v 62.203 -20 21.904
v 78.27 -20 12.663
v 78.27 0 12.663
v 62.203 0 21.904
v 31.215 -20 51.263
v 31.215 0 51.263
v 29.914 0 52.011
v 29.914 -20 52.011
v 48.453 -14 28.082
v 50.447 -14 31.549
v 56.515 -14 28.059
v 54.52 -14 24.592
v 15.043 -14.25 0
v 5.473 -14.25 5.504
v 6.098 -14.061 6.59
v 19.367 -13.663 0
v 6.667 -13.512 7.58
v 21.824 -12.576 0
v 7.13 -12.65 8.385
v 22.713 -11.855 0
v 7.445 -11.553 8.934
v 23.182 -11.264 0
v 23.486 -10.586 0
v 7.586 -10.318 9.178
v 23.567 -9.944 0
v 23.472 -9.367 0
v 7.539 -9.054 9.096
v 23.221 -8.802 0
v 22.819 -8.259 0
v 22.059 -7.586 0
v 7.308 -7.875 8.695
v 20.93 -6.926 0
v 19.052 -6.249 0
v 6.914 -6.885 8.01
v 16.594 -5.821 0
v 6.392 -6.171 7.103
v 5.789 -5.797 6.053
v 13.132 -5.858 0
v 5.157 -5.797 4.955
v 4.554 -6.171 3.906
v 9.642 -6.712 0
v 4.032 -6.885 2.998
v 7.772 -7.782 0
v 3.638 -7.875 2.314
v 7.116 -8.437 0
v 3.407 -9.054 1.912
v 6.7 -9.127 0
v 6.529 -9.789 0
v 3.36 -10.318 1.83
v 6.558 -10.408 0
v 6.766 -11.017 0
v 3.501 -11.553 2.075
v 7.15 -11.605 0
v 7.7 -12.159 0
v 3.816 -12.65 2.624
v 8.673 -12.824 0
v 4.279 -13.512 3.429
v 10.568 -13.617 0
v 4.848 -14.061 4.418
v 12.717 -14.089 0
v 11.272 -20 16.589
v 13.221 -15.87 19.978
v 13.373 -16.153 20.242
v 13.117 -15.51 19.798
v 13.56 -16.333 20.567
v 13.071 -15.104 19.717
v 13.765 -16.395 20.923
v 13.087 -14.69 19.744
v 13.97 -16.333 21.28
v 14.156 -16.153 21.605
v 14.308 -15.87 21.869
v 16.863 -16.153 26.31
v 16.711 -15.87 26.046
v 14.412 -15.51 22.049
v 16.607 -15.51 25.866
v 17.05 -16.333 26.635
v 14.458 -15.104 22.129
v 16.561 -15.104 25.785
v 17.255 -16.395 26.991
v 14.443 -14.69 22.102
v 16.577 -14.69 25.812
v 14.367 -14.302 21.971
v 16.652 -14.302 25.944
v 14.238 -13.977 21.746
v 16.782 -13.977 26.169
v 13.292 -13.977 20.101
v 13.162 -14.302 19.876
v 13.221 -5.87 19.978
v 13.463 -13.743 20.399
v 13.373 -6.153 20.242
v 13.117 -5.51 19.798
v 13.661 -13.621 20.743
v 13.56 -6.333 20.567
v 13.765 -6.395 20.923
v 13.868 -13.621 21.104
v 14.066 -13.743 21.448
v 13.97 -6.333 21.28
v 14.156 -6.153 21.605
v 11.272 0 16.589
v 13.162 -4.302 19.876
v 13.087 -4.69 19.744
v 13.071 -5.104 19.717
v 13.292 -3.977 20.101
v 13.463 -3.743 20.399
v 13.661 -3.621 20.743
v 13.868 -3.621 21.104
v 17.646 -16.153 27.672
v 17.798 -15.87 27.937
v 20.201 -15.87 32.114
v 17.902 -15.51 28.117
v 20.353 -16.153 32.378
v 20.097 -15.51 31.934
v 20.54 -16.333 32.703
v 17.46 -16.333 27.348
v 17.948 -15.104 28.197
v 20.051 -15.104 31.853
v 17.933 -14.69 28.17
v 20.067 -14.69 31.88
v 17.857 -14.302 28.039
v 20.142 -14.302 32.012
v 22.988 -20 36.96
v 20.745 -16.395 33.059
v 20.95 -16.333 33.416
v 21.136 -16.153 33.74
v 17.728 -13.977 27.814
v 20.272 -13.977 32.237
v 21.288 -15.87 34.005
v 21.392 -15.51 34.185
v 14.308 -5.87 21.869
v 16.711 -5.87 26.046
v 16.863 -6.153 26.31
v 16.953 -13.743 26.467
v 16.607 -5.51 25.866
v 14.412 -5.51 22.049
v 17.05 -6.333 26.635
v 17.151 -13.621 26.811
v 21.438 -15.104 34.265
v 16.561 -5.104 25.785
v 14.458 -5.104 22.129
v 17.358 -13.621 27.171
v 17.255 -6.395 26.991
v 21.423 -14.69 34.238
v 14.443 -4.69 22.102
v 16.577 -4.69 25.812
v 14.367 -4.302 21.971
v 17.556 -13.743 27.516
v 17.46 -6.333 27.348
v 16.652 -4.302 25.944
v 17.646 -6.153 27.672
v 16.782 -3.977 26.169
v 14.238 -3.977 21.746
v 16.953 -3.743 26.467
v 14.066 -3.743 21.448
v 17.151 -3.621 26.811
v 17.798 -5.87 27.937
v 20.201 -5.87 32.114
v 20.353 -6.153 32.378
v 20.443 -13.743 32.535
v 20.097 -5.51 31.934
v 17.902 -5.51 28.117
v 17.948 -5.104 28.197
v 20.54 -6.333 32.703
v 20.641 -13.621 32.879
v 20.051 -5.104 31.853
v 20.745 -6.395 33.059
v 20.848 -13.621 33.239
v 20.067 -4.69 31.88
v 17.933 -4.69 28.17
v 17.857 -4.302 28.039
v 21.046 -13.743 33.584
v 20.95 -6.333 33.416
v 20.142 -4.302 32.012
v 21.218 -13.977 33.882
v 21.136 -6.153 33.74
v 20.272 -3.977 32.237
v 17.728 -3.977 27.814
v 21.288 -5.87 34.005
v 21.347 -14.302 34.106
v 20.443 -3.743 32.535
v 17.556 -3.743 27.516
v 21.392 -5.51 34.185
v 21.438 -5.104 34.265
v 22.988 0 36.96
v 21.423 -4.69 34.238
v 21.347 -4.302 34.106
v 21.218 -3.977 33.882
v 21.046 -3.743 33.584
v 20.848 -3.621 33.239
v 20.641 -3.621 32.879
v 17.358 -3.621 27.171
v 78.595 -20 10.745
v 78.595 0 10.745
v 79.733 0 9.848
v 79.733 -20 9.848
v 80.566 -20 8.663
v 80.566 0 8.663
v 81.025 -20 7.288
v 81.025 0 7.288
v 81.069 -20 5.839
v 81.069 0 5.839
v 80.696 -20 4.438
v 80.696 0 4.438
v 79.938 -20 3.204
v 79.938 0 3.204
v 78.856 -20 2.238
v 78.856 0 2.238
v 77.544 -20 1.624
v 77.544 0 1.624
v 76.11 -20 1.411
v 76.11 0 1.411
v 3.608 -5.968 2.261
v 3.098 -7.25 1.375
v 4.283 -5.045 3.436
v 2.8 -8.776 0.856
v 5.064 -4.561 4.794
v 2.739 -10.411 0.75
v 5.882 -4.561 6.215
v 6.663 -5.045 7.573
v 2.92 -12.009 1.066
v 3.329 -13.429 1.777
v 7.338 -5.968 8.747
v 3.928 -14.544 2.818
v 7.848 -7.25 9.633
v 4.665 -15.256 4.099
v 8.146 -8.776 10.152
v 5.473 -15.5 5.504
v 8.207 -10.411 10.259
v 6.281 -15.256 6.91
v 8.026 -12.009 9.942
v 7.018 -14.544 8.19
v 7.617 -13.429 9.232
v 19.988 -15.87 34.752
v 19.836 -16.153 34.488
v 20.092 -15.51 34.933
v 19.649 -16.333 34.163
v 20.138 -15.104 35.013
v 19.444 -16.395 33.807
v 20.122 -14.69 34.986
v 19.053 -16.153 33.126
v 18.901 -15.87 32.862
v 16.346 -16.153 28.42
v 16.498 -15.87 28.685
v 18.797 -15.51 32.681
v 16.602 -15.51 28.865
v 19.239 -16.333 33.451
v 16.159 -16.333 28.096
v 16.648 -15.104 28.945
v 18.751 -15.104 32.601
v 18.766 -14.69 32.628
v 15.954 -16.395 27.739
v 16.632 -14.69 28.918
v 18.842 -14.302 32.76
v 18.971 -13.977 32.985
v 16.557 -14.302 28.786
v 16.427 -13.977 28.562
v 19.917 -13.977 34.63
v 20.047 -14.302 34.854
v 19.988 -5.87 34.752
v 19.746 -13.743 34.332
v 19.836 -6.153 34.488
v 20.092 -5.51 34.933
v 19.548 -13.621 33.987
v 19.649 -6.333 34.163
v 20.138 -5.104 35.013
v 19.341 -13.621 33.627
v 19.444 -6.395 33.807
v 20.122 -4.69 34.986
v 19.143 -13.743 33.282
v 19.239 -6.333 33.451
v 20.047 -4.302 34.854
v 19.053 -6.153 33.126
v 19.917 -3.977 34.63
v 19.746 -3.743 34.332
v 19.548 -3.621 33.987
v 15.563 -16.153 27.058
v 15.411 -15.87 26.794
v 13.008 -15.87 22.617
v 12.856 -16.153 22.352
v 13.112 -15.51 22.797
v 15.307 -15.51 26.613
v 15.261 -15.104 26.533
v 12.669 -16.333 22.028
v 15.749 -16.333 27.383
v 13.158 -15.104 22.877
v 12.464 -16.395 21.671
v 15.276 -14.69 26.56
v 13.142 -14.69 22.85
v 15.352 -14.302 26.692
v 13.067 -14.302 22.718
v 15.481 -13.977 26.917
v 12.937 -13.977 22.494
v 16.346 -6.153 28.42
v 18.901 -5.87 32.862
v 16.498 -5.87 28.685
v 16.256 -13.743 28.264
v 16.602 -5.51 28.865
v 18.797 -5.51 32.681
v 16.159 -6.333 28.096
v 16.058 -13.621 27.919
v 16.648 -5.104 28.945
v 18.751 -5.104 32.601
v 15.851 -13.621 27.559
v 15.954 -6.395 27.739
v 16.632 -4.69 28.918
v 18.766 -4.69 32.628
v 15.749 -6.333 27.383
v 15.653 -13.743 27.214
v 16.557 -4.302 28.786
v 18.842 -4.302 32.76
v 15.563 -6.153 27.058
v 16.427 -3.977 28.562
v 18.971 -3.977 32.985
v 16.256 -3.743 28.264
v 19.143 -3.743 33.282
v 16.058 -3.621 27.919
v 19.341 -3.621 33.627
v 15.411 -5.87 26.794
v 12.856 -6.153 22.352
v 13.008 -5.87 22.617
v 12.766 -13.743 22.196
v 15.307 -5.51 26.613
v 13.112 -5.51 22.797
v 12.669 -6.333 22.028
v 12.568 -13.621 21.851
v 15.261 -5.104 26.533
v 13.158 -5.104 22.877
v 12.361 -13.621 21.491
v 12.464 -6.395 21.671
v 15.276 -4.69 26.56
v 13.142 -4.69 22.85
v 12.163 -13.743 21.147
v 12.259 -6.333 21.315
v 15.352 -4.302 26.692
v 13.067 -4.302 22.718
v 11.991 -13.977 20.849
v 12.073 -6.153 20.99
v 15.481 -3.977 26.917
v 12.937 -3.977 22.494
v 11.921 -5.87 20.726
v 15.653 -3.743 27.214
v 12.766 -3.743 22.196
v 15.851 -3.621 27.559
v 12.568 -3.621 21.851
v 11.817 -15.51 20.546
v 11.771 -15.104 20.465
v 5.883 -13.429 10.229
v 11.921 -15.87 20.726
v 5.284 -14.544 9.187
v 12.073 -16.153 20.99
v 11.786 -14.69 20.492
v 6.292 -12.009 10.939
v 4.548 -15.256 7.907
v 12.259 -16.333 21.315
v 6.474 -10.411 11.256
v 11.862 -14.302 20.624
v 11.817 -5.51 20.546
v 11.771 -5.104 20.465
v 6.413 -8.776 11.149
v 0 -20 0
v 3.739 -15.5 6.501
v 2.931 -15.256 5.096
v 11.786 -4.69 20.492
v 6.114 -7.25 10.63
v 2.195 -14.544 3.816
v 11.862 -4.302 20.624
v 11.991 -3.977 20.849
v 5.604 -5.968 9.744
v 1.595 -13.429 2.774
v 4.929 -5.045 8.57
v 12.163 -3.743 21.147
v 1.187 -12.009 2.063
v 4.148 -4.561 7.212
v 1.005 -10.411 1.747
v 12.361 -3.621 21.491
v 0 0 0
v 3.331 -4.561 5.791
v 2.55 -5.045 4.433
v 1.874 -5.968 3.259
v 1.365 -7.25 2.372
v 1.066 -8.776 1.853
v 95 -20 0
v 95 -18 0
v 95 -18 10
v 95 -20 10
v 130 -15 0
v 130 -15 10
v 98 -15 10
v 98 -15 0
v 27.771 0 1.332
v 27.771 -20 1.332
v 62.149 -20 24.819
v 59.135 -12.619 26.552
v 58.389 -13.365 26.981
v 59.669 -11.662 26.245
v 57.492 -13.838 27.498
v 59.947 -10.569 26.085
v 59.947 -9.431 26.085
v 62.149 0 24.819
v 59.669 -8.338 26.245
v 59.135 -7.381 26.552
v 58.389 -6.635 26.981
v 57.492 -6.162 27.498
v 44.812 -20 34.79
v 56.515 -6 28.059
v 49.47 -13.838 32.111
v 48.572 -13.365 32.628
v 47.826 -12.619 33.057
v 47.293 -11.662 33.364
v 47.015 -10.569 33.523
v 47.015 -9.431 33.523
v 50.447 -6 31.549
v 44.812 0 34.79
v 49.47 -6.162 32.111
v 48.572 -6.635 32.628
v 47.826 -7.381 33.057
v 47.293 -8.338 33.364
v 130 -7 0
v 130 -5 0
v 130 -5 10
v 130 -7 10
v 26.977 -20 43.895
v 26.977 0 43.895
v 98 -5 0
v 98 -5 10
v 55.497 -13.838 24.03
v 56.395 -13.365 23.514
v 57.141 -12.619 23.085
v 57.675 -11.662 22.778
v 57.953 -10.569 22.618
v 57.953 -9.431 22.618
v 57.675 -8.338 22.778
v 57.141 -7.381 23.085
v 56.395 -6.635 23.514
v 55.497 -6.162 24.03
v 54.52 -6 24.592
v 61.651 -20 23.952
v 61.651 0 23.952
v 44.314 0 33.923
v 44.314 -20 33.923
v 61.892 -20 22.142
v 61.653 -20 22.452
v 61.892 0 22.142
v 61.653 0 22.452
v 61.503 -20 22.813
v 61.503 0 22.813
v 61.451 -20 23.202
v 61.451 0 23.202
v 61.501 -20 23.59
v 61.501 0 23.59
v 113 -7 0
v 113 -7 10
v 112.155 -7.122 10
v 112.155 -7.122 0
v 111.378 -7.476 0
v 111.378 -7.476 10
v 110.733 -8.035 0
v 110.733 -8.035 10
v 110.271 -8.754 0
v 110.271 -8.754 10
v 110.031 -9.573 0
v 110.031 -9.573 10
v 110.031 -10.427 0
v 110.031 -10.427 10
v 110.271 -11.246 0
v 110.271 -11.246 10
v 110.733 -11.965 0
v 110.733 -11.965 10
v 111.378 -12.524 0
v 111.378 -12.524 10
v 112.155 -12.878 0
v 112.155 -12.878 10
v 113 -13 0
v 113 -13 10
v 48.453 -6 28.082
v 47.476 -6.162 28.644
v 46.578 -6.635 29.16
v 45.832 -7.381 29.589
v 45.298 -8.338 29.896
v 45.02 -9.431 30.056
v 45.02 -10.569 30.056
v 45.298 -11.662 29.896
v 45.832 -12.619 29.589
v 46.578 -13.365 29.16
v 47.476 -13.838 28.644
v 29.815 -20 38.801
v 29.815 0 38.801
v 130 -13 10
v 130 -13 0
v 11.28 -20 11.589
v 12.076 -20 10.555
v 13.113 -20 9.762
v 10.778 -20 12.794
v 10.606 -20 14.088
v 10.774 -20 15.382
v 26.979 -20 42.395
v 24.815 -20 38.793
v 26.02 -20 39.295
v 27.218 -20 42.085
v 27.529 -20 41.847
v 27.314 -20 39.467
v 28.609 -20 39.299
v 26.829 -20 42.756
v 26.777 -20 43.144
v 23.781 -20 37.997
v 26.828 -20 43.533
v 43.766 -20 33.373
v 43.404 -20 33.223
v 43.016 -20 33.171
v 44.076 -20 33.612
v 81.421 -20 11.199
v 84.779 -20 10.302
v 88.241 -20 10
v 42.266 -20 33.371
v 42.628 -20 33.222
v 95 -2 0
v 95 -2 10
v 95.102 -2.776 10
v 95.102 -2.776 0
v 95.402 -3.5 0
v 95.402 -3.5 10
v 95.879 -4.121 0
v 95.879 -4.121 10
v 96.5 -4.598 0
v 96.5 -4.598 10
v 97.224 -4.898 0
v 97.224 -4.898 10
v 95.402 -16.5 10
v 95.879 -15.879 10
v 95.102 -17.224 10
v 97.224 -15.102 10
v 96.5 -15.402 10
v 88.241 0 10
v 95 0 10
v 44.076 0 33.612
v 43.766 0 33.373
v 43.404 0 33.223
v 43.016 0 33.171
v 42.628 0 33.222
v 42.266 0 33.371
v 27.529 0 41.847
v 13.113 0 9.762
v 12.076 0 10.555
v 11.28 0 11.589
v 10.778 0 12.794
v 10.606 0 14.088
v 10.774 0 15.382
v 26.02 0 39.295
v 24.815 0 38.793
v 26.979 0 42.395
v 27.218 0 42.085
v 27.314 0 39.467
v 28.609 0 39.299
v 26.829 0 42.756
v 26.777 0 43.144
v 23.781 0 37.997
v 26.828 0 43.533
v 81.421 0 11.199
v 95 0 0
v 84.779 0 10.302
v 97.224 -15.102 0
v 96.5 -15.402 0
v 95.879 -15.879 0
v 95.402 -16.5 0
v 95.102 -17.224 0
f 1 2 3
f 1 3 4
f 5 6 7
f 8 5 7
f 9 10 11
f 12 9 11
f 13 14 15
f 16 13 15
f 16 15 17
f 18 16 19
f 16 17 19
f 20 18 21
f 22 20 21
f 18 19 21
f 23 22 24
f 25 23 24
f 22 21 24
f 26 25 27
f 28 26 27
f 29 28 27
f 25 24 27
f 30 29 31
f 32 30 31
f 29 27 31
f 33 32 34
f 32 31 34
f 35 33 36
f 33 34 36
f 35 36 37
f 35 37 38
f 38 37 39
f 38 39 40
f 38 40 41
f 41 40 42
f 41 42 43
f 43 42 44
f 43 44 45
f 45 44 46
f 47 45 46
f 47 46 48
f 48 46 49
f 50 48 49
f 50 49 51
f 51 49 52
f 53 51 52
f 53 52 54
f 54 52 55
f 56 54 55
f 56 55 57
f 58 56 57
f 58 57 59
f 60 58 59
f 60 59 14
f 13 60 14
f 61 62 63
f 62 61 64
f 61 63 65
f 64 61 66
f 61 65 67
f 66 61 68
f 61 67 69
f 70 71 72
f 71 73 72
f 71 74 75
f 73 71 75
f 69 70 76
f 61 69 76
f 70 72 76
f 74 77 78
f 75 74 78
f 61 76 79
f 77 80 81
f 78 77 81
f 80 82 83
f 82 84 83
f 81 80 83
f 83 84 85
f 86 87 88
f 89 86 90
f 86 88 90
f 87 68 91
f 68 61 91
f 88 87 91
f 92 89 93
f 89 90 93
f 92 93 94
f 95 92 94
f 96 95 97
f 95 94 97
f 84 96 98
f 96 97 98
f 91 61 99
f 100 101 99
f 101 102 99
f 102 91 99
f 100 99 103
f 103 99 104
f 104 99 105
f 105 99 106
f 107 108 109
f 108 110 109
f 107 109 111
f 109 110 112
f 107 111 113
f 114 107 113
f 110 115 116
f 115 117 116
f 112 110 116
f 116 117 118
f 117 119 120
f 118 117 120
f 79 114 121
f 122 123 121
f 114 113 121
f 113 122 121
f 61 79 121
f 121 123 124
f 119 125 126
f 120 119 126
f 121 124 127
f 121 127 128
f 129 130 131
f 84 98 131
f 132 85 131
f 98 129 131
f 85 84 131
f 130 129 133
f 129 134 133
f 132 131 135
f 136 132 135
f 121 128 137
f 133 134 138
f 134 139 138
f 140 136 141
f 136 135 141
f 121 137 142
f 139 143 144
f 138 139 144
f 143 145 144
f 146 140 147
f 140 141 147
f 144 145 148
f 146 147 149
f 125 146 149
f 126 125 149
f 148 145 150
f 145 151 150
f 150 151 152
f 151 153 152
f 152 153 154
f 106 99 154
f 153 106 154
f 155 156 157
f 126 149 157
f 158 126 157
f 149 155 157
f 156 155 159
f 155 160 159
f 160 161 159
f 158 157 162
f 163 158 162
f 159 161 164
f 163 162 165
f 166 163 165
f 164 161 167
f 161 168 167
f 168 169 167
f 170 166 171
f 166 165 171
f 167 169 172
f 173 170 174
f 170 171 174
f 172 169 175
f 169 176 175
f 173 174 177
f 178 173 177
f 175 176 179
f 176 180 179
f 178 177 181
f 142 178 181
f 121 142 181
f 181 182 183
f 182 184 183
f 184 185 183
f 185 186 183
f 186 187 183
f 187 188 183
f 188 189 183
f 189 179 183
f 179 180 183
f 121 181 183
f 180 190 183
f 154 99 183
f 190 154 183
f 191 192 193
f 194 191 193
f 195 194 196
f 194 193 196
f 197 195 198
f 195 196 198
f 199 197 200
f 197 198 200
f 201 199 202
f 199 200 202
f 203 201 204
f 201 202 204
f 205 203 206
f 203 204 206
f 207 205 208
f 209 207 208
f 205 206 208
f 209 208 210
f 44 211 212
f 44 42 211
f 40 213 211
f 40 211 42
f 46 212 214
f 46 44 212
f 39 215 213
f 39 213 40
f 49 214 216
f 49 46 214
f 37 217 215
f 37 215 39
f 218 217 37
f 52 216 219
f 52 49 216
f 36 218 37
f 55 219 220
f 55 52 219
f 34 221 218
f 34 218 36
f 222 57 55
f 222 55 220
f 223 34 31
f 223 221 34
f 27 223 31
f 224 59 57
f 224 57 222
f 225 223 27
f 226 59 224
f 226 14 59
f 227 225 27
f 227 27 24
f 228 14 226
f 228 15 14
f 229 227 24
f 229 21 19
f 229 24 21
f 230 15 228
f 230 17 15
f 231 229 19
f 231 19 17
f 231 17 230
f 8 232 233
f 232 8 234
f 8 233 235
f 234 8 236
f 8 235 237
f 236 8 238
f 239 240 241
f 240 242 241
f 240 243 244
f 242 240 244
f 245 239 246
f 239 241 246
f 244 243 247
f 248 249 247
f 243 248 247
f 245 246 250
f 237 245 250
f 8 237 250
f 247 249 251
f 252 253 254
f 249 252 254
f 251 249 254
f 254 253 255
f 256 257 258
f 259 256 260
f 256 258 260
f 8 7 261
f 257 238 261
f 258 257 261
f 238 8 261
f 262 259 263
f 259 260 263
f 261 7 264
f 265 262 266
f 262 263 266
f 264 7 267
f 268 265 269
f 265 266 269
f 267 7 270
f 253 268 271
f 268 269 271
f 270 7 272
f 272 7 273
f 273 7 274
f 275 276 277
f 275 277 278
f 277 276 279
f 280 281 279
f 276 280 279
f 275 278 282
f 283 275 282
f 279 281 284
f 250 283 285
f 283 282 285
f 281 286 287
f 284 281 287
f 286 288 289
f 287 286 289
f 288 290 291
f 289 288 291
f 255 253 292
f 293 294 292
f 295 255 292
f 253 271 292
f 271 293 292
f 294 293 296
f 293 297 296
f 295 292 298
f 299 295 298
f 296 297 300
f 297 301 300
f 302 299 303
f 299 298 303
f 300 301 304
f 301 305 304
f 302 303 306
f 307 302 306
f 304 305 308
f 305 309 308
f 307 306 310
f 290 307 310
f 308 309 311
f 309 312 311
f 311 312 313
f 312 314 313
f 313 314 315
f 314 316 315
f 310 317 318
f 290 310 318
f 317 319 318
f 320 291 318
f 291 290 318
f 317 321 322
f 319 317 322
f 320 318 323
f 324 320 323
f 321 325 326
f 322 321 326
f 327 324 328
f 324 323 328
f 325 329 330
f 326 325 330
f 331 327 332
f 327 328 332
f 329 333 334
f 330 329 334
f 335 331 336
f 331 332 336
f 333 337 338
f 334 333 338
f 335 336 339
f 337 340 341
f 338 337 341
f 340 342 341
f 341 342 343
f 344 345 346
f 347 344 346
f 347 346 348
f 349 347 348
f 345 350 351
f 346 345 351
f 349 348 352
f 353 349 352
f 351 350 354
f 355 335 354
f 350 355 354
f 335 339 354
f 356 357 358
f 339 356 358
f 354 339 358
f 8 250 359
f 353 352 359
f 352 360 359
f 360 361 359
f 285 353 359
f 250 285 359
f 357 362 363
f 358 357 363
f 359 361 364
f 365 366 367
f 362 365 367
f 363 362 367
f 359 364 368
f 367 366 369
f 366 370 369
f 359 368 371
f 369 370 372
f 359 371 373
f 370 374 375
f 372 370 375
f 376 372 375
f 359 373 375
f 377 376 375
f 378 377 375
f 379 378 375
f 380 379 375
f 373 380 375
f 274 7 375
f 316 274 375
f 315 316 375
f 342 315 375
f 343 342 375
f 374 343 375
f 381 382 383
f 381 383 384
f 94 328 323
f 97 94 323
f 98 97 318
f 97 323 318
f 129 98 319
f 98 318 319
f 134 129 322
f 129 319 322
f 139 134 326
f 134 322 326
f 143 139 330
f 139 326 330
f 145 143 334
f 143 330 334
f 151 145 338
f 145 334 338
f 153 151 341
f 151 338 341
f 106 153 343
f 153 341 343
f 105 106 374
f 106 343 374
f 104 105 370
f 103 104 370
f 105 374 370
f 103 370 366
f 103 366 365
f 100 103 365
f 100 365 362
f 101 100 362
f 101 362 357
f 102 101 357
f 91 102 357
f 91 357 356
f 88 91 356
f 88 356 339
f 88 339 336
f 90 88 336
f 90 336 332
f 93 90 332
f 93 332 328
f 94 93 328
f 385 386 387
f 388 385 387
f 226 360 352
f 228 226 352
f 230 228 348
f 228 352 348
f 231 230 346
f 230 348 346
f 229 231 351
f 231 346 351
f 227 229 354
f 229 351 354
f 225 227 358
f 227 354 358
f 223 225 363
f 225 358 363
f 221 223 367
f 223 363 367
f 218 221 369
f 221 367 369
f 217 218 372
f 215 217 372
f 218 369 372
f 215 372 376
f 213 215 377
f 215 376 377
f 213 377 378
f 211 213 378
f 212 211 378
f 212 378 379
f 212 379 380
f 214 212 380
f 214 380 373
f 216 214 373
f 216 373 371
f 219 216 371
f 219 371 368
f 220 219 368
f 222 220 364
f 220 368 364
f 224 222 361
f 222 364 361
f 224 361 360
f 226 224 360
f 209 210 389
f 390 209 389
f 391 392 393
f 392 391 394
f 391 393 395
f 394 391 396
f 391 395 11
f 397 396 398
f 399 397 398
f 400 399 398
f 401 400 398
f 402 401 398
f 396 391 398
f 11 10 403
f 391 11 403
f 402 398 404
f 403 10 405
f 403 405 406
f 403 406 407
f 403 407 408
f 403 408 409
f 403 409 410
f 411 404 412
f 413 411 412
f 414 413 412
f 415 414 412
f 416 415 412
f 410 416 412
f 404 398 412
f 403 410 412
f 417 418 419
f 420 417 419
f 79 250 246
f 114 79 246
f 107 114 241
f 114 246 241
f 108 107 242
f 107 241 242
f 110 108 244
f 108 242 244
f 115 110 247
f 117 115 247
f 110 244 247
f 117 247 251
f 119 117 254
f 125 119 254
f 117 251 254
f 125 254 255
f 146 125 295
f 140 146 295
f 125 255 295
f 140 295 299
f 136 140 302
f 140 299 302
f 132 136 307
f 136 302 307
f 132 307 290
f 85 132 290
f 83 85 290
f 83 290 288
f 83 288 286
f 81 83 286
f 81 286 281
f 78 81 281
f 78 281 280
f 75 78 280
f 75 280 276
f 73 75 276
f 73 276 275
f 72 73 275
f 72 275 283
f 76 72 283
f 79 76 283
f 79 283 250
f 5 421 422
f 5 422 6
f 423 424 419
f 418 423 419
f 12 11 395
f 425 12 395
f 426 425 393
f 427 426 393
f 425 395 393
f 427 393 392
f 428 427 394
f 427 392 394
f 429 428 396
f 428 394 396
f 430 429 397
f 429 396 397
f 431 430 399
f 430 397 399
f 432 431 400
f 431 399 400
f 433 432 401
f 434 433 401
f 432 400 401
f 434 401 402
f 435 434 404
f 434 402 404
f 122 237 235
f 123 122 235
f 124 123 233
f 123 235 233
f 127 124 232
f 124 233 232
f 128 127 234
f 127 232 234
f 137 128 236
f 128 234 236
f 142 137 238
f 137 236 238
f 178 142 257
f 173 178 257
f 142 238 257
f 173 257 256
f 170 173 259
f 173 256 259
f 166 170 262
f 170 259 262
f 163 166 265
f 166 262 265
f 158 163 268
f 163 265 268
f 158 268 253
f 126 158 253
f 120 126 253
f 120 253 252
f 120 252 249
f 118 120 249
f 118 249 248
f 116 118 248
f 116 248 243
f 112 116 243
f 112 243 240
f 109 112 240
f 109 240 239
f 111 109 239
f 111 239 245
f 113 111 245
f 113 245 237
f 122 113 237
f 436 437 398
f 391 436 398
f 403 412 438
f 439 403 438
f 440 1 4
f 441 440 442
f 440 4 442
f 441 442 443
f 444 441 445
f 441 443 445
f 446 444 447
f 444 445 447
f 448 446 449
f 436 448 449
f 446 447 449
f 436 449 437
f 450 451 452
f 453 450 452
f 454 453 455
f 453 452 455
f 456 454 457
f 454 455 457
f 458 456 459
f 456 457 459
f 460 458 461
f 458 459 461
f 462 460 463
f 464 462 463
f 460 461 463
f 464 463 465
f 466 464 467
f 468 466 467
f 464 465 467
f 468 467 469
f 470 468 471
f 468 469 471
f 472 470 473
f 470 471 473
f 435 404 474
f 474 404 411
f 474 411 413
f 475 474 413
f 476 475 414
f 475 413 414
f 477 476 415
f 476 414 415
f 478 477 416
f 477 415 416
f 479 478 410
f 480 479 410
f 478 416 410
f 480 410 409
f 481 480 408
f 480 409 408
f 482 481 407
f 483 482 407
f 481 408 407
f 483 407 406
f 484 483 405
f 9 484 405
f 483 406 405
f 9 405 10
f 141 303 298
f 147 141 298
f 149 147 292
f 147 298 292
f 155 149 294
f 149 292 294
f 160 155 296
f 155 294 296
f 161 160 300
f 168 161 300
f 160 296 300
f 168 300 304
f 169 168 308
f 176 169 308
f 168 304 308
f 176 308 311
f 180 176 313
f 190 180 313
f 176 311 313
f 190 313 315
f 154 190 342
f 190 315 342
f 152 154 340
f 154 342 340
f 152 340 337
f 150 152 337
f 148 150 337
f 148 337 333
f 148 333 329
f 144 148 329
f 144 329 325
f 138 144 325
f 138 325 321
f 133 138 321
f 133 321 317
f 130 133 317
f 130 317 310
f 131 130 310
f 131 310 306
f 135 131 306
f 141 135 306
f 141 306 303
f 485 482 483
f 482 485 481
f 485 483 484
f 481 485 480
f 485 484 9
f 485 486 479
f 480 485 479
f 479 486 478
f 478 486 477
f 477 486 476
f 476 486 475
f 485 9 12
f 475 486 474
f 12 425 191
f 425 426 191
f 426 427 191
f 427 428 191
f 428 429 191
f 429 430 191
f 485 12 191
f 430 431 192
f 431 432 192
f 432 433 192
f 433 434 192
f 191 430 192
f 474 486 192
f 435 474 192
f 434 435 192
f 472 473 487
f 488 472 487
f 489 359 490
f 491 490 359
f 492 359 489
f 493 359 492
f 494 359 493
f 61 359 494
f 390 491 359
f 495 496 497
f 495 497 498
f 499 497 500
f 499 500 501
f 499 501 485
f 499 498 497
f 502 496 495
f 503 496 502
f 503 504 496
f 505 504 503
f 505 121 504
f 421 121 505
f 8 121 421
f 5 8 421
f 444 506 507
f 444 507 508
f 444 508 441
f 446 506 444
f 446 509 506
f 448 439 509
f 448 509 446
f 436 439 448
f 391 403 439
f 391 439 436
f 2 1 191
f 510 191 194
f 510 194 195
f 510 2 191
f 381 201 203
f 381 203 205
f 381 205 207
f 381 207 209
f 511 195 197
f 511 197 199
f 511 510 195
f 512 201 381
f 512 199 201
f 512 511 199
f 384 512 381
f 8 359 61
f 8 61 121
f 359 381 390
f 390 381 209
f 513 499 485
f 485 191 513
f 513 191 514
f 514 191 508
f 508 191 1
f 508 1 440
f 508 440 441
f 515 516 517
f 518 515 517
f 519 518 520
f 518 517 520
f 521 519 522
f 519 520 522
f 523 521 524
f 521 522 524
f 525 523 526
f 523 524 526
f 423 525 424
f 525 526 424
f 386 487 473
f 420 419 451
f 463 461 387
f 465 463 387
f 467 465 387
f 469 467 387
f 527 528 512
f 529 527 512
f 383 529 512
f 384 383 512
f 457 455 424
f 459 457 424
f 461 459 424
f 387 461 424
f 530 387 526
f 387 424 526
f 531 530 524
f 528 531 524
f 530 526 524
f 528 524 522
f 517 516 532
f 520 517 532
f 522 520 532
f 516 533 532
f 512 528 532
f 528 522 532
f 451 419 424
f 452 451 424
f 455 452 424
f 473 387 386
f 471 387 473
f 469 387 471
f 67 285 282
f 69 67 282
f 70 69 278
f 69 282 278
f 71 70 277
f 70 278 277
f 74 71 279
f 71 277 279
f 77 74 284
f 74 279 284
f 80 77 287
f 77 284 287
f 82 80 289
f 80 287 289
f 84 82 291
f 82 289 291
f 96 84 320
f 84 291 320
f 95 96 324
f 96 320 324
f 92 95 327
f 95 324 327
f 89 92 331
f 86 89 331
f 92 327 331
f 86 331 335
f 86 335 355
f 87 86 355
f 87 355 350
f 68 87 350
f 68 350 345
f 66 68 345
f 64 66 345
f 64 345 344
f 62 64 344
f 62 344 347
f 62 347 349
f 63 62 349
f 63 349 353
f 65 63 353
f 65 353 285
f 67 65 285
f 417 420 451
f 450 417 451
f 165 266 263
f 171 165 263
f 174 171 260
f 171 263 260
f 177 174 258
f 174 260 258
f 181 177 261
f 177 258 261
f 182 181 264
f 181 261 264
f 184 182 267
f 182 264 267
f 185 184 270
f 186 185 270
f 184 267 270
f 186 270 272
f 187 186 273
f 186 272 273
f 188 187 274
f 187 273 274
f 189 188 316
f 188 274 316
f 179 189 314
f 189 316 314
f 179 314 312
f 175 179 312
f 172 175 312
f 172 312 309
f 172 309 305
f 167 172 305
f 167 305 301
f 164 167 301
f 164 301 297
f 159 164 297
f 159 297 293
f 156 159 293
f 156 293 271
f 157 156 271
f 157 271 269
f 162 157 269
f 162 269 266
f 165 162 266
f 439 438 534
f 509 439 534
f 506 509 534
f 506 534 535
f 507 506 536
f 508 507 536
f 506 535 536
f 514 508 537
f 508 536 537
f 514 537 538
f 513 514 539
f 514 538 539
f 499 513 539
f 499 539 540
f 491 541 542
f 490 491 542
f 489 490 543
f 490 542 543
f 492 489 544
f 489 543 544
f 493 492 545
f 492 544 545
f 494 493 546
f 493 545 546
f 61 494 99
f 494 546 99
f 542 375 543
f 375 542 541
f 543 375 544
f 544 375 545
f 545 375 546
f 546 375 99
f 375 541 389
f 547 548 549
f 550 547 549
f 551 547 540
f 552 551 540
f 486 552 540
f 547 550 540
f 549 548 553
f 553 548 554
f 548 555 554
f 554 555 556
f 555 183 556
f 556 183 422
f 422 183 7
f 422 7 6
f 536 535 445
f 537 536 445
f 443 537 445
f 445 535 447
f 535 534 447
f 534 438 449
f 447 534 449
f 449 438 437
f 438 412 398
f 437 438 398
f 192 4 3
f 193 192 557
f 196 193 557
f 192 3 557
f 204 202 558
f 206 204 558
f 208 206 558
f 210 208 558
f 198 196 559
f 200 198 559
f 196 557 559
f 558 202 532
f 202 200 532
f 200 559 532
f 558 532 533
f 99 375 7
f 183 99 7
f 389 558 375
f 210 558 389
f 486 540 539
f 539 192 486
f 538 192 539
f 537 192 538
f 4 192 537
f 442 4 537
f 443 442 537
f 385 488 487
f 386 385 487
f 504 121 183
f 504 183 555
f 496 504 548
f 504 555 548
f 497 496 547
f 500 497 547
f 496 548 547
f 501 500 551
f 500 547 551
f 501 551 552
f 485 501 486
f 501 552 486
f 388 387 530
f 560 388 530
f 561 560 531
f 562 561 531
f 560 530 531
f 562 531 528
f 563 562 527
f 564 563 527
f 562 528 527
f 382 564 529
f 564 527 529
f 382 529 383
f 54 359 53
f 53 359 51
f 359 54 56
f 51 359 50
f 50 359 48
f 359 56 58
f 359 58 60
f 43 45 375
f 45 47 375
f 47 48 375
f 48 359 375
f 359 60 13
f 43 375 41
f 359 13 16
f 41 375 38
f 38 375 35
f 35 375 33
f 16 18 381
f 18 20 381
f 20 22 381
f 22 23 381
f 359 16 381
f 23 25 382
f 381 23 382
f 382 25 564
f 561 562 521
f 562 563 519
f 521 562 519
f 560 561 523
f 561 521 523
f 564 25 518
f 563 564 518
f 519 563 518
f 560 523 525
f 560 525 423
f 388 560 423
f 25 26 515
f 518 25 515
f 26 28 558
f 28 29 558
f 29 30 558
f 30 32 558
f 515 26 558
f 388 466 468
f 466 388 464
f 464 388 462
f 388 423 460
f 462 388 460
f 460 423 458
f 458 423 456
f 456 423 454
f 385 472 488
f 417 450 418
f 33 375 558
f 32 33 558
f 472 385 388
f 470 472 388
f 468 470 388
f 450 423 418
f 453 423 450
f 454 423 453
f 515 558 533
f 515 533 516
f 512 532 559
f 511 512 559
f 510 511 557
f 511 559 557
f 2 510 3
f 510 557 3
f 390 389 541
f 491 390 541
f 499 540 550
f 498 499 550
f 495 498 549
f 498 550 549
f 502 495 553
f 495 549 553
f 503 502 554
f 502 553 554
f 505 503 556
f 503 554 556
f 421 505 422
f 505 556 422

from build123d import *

# Parameters (mm, degrees)
F1_DEPTH  = 20
F2_R      = 4.25
F2_R_2    = 1.395
F3_DEPTH  = 30
F2_R_3    = 5.5
F4_DEPTH  = 2
F6_DEPTH  = 25
F8_DEPTH  = 10.001
F10_DEPTH = 15


with BuildPart() as f1:
    # F0 (on Front) → F1 (new body)
    with BuildSketch(Plane.XZ):
        with BuildLine():
            Line((29.9143858576, 52.0108596234), (0, 0))
            Line((0, 0), (130, 0))
            Line((130, 0), (130, 10))
            Line((130, 10), (88.2409628552, 10))
            ThreePointArc((88.2409628552, 10), (83.0804911789, 10.6772276296), (78.2695009027, 12.6630467922))
            Line((78.2695009027, 12.6630467922), (62.2031042781, 21.9037398215))
            ThreePointArc((62.2031042781, 21.9037398215), (61.5027165088, 22.8133971511), (61.650692434, 23.9518709585))
            Line((61.650692434, 23.9518709585), (62.1492655316, 24.8187186189))
            Line((62.1492655316, 24.8187186189), (44.8123123238, 34.7901805715))
            Line((44.8123123238, 34.7901805715), (44.3137392262, 33.9233329111))
            ThreePointArc((44.3137392262, 33.9233329111), (43.4040818966, 33.2229451418), (42.2656080891, 33.3709210669))
            Line((42.2656080891, 33.3709210669), (27.5291978625, 41.8466637266))
            ThreePointArc((27.5291978625, 41.8466637266), (26.8288100932, 42.7563210562), (26.9767860184, 43.8947948636))
            Line((26.9767860184, 43.8947948636), (31.2146573482, 51.2629999769))
            Line((31.2146573482, 51.2629999769), (29.9143858576, 52.0108596234))
        make_face()
        with BuildLine():
            Line((27.7705867405, 1.3316440692), (13.1131062569, 9.7619897713))
            ThreePointArc((13.1131062569, 9.7619897713), (10.7784803592, 12.7941808699), (11.2717334431, 16.5890935613))
            Line((11.2717334431, 16.5890935613), (22.9882012374, 36.9600135805))
            ThreePointArc((22.9882012374, 36.9600135805), (26.020392336, 39.2946394782), (29.8153050274, 38.8013863943))
            Line((29.8153050274, 38.8013863943), (78.5948983283, 10.7454844818))
            ThreePointArc((78.5948983283, 10.7454844818), (80.9337866185, 5.1251064419), (76.1102671502, 1.4112529602))
            Line((76.1102671502, 1.4112529602), (27.7705867405, 1.3316440692))
        make_face(mode=Mode.SUBTRACT)
    extrude(amount=F1_DEPTH)

    # F2 (on face) → F3 (cut)
    with BuildSketch(Plane(origin=(0, 0, 0), x_dir=(0, -1, 0), z_dir=(-0.8668476604, 0, 0.4985730976))):
        with Locations((10, 7.5)):
            Circle(F2_R)
        with Locations((5, 39)):
            Circle(F2_R_2)
        with Locations((5, 32)):
            Circle(F2_R_2)
        with Locations((15, 32)):
            Circle(F2_R_2)
        with Locations((15, 39)):
            Circle(F2_R_2)
        with Locations((5, 25)):
            Circle(F2_R_2)
        with Locations((15, 25)):
            Circle(F2_R_2)
    extrude(amount=-F3_DEPTH, mode=Mode.SUBTRACT)

    # F2 (on face) → F4 (cut)
    with BuildSketch(Plane(origin=(0, 0, 0), x_dir=(0, -1, 0), z_dir=(-0.8668476604, 0, 0.4985730976))):
        with Locations((10, 7.5)):
            Circle(F2_R_3)
        with Locations((10, 7.5)):
            Circle(F2_R, mode=Mode.SUBTRACT)
    extrude(amount=-F4_DEPTH, mode=Mode.SUBTRACT)

    # F5 (on face) → F6 (cut)
    with BuildSketch(Plane.XY.offset(10)):
        with BuildLine():
            Line((95, -18), (95, -20))
            Line((95, -20), (130, -20))
            Line((130, -20), (130, -15))
            Line((130, -15), (98, -15))
            ThreePointArc((98, -15), (95.8786796564, -15.8786796564), (95, -18))
        make_face()
        with BuildLine():
            Line((130, 0), (95, 0))
            Line((95, 0), (95, -2))
            ThreePointArc((95, -2), (95.8786796564, -4.1213203436), (98, -5))
            Line((98, -5), (130, -5))
            Line((130, -5), (130, 0))
        make_face()
    extrude(amount=-F6_DEPTH, mode=Mode.SUBTRACT)

    # F7 (on face) → F8 (cut, through all)
    with BuildSketch(Plane.XY.offset(10)):
        with BuildLine():
            Line((130, -13), (130, -7))
            Line((130, -7), (113, -7))
            ThreePointArc((113, -7), (110, -10), (113, -13))
            Line((113, -13), (130, -13))
        make_face()
    extrude(amount=-F8_DEPTH, mode=Mode.SUBTRACT)

    # F9 (on face) → F10 (cut)
    with BuildSketch(Plane(origin=(26.1750876254, 0, 45.5095021704), x_dir=(0.8668476604, 0, -0.4985730976), z_dir=(0.4985730976, 0, 0.8668476604))):
        with BuildLine():
            ThreePointArc((28, -6), (24, -10), (28, -14))
            Line((28, -14), (35, -14))
            ThreePointArc((35, -14), (39, -10), (35, -6))
            Line((35, -6), (28, -6))
        make_face()
    extrude(amount=-F10_DEPTH, mode=Mode.SUBTRACT)


solid = f1.part
